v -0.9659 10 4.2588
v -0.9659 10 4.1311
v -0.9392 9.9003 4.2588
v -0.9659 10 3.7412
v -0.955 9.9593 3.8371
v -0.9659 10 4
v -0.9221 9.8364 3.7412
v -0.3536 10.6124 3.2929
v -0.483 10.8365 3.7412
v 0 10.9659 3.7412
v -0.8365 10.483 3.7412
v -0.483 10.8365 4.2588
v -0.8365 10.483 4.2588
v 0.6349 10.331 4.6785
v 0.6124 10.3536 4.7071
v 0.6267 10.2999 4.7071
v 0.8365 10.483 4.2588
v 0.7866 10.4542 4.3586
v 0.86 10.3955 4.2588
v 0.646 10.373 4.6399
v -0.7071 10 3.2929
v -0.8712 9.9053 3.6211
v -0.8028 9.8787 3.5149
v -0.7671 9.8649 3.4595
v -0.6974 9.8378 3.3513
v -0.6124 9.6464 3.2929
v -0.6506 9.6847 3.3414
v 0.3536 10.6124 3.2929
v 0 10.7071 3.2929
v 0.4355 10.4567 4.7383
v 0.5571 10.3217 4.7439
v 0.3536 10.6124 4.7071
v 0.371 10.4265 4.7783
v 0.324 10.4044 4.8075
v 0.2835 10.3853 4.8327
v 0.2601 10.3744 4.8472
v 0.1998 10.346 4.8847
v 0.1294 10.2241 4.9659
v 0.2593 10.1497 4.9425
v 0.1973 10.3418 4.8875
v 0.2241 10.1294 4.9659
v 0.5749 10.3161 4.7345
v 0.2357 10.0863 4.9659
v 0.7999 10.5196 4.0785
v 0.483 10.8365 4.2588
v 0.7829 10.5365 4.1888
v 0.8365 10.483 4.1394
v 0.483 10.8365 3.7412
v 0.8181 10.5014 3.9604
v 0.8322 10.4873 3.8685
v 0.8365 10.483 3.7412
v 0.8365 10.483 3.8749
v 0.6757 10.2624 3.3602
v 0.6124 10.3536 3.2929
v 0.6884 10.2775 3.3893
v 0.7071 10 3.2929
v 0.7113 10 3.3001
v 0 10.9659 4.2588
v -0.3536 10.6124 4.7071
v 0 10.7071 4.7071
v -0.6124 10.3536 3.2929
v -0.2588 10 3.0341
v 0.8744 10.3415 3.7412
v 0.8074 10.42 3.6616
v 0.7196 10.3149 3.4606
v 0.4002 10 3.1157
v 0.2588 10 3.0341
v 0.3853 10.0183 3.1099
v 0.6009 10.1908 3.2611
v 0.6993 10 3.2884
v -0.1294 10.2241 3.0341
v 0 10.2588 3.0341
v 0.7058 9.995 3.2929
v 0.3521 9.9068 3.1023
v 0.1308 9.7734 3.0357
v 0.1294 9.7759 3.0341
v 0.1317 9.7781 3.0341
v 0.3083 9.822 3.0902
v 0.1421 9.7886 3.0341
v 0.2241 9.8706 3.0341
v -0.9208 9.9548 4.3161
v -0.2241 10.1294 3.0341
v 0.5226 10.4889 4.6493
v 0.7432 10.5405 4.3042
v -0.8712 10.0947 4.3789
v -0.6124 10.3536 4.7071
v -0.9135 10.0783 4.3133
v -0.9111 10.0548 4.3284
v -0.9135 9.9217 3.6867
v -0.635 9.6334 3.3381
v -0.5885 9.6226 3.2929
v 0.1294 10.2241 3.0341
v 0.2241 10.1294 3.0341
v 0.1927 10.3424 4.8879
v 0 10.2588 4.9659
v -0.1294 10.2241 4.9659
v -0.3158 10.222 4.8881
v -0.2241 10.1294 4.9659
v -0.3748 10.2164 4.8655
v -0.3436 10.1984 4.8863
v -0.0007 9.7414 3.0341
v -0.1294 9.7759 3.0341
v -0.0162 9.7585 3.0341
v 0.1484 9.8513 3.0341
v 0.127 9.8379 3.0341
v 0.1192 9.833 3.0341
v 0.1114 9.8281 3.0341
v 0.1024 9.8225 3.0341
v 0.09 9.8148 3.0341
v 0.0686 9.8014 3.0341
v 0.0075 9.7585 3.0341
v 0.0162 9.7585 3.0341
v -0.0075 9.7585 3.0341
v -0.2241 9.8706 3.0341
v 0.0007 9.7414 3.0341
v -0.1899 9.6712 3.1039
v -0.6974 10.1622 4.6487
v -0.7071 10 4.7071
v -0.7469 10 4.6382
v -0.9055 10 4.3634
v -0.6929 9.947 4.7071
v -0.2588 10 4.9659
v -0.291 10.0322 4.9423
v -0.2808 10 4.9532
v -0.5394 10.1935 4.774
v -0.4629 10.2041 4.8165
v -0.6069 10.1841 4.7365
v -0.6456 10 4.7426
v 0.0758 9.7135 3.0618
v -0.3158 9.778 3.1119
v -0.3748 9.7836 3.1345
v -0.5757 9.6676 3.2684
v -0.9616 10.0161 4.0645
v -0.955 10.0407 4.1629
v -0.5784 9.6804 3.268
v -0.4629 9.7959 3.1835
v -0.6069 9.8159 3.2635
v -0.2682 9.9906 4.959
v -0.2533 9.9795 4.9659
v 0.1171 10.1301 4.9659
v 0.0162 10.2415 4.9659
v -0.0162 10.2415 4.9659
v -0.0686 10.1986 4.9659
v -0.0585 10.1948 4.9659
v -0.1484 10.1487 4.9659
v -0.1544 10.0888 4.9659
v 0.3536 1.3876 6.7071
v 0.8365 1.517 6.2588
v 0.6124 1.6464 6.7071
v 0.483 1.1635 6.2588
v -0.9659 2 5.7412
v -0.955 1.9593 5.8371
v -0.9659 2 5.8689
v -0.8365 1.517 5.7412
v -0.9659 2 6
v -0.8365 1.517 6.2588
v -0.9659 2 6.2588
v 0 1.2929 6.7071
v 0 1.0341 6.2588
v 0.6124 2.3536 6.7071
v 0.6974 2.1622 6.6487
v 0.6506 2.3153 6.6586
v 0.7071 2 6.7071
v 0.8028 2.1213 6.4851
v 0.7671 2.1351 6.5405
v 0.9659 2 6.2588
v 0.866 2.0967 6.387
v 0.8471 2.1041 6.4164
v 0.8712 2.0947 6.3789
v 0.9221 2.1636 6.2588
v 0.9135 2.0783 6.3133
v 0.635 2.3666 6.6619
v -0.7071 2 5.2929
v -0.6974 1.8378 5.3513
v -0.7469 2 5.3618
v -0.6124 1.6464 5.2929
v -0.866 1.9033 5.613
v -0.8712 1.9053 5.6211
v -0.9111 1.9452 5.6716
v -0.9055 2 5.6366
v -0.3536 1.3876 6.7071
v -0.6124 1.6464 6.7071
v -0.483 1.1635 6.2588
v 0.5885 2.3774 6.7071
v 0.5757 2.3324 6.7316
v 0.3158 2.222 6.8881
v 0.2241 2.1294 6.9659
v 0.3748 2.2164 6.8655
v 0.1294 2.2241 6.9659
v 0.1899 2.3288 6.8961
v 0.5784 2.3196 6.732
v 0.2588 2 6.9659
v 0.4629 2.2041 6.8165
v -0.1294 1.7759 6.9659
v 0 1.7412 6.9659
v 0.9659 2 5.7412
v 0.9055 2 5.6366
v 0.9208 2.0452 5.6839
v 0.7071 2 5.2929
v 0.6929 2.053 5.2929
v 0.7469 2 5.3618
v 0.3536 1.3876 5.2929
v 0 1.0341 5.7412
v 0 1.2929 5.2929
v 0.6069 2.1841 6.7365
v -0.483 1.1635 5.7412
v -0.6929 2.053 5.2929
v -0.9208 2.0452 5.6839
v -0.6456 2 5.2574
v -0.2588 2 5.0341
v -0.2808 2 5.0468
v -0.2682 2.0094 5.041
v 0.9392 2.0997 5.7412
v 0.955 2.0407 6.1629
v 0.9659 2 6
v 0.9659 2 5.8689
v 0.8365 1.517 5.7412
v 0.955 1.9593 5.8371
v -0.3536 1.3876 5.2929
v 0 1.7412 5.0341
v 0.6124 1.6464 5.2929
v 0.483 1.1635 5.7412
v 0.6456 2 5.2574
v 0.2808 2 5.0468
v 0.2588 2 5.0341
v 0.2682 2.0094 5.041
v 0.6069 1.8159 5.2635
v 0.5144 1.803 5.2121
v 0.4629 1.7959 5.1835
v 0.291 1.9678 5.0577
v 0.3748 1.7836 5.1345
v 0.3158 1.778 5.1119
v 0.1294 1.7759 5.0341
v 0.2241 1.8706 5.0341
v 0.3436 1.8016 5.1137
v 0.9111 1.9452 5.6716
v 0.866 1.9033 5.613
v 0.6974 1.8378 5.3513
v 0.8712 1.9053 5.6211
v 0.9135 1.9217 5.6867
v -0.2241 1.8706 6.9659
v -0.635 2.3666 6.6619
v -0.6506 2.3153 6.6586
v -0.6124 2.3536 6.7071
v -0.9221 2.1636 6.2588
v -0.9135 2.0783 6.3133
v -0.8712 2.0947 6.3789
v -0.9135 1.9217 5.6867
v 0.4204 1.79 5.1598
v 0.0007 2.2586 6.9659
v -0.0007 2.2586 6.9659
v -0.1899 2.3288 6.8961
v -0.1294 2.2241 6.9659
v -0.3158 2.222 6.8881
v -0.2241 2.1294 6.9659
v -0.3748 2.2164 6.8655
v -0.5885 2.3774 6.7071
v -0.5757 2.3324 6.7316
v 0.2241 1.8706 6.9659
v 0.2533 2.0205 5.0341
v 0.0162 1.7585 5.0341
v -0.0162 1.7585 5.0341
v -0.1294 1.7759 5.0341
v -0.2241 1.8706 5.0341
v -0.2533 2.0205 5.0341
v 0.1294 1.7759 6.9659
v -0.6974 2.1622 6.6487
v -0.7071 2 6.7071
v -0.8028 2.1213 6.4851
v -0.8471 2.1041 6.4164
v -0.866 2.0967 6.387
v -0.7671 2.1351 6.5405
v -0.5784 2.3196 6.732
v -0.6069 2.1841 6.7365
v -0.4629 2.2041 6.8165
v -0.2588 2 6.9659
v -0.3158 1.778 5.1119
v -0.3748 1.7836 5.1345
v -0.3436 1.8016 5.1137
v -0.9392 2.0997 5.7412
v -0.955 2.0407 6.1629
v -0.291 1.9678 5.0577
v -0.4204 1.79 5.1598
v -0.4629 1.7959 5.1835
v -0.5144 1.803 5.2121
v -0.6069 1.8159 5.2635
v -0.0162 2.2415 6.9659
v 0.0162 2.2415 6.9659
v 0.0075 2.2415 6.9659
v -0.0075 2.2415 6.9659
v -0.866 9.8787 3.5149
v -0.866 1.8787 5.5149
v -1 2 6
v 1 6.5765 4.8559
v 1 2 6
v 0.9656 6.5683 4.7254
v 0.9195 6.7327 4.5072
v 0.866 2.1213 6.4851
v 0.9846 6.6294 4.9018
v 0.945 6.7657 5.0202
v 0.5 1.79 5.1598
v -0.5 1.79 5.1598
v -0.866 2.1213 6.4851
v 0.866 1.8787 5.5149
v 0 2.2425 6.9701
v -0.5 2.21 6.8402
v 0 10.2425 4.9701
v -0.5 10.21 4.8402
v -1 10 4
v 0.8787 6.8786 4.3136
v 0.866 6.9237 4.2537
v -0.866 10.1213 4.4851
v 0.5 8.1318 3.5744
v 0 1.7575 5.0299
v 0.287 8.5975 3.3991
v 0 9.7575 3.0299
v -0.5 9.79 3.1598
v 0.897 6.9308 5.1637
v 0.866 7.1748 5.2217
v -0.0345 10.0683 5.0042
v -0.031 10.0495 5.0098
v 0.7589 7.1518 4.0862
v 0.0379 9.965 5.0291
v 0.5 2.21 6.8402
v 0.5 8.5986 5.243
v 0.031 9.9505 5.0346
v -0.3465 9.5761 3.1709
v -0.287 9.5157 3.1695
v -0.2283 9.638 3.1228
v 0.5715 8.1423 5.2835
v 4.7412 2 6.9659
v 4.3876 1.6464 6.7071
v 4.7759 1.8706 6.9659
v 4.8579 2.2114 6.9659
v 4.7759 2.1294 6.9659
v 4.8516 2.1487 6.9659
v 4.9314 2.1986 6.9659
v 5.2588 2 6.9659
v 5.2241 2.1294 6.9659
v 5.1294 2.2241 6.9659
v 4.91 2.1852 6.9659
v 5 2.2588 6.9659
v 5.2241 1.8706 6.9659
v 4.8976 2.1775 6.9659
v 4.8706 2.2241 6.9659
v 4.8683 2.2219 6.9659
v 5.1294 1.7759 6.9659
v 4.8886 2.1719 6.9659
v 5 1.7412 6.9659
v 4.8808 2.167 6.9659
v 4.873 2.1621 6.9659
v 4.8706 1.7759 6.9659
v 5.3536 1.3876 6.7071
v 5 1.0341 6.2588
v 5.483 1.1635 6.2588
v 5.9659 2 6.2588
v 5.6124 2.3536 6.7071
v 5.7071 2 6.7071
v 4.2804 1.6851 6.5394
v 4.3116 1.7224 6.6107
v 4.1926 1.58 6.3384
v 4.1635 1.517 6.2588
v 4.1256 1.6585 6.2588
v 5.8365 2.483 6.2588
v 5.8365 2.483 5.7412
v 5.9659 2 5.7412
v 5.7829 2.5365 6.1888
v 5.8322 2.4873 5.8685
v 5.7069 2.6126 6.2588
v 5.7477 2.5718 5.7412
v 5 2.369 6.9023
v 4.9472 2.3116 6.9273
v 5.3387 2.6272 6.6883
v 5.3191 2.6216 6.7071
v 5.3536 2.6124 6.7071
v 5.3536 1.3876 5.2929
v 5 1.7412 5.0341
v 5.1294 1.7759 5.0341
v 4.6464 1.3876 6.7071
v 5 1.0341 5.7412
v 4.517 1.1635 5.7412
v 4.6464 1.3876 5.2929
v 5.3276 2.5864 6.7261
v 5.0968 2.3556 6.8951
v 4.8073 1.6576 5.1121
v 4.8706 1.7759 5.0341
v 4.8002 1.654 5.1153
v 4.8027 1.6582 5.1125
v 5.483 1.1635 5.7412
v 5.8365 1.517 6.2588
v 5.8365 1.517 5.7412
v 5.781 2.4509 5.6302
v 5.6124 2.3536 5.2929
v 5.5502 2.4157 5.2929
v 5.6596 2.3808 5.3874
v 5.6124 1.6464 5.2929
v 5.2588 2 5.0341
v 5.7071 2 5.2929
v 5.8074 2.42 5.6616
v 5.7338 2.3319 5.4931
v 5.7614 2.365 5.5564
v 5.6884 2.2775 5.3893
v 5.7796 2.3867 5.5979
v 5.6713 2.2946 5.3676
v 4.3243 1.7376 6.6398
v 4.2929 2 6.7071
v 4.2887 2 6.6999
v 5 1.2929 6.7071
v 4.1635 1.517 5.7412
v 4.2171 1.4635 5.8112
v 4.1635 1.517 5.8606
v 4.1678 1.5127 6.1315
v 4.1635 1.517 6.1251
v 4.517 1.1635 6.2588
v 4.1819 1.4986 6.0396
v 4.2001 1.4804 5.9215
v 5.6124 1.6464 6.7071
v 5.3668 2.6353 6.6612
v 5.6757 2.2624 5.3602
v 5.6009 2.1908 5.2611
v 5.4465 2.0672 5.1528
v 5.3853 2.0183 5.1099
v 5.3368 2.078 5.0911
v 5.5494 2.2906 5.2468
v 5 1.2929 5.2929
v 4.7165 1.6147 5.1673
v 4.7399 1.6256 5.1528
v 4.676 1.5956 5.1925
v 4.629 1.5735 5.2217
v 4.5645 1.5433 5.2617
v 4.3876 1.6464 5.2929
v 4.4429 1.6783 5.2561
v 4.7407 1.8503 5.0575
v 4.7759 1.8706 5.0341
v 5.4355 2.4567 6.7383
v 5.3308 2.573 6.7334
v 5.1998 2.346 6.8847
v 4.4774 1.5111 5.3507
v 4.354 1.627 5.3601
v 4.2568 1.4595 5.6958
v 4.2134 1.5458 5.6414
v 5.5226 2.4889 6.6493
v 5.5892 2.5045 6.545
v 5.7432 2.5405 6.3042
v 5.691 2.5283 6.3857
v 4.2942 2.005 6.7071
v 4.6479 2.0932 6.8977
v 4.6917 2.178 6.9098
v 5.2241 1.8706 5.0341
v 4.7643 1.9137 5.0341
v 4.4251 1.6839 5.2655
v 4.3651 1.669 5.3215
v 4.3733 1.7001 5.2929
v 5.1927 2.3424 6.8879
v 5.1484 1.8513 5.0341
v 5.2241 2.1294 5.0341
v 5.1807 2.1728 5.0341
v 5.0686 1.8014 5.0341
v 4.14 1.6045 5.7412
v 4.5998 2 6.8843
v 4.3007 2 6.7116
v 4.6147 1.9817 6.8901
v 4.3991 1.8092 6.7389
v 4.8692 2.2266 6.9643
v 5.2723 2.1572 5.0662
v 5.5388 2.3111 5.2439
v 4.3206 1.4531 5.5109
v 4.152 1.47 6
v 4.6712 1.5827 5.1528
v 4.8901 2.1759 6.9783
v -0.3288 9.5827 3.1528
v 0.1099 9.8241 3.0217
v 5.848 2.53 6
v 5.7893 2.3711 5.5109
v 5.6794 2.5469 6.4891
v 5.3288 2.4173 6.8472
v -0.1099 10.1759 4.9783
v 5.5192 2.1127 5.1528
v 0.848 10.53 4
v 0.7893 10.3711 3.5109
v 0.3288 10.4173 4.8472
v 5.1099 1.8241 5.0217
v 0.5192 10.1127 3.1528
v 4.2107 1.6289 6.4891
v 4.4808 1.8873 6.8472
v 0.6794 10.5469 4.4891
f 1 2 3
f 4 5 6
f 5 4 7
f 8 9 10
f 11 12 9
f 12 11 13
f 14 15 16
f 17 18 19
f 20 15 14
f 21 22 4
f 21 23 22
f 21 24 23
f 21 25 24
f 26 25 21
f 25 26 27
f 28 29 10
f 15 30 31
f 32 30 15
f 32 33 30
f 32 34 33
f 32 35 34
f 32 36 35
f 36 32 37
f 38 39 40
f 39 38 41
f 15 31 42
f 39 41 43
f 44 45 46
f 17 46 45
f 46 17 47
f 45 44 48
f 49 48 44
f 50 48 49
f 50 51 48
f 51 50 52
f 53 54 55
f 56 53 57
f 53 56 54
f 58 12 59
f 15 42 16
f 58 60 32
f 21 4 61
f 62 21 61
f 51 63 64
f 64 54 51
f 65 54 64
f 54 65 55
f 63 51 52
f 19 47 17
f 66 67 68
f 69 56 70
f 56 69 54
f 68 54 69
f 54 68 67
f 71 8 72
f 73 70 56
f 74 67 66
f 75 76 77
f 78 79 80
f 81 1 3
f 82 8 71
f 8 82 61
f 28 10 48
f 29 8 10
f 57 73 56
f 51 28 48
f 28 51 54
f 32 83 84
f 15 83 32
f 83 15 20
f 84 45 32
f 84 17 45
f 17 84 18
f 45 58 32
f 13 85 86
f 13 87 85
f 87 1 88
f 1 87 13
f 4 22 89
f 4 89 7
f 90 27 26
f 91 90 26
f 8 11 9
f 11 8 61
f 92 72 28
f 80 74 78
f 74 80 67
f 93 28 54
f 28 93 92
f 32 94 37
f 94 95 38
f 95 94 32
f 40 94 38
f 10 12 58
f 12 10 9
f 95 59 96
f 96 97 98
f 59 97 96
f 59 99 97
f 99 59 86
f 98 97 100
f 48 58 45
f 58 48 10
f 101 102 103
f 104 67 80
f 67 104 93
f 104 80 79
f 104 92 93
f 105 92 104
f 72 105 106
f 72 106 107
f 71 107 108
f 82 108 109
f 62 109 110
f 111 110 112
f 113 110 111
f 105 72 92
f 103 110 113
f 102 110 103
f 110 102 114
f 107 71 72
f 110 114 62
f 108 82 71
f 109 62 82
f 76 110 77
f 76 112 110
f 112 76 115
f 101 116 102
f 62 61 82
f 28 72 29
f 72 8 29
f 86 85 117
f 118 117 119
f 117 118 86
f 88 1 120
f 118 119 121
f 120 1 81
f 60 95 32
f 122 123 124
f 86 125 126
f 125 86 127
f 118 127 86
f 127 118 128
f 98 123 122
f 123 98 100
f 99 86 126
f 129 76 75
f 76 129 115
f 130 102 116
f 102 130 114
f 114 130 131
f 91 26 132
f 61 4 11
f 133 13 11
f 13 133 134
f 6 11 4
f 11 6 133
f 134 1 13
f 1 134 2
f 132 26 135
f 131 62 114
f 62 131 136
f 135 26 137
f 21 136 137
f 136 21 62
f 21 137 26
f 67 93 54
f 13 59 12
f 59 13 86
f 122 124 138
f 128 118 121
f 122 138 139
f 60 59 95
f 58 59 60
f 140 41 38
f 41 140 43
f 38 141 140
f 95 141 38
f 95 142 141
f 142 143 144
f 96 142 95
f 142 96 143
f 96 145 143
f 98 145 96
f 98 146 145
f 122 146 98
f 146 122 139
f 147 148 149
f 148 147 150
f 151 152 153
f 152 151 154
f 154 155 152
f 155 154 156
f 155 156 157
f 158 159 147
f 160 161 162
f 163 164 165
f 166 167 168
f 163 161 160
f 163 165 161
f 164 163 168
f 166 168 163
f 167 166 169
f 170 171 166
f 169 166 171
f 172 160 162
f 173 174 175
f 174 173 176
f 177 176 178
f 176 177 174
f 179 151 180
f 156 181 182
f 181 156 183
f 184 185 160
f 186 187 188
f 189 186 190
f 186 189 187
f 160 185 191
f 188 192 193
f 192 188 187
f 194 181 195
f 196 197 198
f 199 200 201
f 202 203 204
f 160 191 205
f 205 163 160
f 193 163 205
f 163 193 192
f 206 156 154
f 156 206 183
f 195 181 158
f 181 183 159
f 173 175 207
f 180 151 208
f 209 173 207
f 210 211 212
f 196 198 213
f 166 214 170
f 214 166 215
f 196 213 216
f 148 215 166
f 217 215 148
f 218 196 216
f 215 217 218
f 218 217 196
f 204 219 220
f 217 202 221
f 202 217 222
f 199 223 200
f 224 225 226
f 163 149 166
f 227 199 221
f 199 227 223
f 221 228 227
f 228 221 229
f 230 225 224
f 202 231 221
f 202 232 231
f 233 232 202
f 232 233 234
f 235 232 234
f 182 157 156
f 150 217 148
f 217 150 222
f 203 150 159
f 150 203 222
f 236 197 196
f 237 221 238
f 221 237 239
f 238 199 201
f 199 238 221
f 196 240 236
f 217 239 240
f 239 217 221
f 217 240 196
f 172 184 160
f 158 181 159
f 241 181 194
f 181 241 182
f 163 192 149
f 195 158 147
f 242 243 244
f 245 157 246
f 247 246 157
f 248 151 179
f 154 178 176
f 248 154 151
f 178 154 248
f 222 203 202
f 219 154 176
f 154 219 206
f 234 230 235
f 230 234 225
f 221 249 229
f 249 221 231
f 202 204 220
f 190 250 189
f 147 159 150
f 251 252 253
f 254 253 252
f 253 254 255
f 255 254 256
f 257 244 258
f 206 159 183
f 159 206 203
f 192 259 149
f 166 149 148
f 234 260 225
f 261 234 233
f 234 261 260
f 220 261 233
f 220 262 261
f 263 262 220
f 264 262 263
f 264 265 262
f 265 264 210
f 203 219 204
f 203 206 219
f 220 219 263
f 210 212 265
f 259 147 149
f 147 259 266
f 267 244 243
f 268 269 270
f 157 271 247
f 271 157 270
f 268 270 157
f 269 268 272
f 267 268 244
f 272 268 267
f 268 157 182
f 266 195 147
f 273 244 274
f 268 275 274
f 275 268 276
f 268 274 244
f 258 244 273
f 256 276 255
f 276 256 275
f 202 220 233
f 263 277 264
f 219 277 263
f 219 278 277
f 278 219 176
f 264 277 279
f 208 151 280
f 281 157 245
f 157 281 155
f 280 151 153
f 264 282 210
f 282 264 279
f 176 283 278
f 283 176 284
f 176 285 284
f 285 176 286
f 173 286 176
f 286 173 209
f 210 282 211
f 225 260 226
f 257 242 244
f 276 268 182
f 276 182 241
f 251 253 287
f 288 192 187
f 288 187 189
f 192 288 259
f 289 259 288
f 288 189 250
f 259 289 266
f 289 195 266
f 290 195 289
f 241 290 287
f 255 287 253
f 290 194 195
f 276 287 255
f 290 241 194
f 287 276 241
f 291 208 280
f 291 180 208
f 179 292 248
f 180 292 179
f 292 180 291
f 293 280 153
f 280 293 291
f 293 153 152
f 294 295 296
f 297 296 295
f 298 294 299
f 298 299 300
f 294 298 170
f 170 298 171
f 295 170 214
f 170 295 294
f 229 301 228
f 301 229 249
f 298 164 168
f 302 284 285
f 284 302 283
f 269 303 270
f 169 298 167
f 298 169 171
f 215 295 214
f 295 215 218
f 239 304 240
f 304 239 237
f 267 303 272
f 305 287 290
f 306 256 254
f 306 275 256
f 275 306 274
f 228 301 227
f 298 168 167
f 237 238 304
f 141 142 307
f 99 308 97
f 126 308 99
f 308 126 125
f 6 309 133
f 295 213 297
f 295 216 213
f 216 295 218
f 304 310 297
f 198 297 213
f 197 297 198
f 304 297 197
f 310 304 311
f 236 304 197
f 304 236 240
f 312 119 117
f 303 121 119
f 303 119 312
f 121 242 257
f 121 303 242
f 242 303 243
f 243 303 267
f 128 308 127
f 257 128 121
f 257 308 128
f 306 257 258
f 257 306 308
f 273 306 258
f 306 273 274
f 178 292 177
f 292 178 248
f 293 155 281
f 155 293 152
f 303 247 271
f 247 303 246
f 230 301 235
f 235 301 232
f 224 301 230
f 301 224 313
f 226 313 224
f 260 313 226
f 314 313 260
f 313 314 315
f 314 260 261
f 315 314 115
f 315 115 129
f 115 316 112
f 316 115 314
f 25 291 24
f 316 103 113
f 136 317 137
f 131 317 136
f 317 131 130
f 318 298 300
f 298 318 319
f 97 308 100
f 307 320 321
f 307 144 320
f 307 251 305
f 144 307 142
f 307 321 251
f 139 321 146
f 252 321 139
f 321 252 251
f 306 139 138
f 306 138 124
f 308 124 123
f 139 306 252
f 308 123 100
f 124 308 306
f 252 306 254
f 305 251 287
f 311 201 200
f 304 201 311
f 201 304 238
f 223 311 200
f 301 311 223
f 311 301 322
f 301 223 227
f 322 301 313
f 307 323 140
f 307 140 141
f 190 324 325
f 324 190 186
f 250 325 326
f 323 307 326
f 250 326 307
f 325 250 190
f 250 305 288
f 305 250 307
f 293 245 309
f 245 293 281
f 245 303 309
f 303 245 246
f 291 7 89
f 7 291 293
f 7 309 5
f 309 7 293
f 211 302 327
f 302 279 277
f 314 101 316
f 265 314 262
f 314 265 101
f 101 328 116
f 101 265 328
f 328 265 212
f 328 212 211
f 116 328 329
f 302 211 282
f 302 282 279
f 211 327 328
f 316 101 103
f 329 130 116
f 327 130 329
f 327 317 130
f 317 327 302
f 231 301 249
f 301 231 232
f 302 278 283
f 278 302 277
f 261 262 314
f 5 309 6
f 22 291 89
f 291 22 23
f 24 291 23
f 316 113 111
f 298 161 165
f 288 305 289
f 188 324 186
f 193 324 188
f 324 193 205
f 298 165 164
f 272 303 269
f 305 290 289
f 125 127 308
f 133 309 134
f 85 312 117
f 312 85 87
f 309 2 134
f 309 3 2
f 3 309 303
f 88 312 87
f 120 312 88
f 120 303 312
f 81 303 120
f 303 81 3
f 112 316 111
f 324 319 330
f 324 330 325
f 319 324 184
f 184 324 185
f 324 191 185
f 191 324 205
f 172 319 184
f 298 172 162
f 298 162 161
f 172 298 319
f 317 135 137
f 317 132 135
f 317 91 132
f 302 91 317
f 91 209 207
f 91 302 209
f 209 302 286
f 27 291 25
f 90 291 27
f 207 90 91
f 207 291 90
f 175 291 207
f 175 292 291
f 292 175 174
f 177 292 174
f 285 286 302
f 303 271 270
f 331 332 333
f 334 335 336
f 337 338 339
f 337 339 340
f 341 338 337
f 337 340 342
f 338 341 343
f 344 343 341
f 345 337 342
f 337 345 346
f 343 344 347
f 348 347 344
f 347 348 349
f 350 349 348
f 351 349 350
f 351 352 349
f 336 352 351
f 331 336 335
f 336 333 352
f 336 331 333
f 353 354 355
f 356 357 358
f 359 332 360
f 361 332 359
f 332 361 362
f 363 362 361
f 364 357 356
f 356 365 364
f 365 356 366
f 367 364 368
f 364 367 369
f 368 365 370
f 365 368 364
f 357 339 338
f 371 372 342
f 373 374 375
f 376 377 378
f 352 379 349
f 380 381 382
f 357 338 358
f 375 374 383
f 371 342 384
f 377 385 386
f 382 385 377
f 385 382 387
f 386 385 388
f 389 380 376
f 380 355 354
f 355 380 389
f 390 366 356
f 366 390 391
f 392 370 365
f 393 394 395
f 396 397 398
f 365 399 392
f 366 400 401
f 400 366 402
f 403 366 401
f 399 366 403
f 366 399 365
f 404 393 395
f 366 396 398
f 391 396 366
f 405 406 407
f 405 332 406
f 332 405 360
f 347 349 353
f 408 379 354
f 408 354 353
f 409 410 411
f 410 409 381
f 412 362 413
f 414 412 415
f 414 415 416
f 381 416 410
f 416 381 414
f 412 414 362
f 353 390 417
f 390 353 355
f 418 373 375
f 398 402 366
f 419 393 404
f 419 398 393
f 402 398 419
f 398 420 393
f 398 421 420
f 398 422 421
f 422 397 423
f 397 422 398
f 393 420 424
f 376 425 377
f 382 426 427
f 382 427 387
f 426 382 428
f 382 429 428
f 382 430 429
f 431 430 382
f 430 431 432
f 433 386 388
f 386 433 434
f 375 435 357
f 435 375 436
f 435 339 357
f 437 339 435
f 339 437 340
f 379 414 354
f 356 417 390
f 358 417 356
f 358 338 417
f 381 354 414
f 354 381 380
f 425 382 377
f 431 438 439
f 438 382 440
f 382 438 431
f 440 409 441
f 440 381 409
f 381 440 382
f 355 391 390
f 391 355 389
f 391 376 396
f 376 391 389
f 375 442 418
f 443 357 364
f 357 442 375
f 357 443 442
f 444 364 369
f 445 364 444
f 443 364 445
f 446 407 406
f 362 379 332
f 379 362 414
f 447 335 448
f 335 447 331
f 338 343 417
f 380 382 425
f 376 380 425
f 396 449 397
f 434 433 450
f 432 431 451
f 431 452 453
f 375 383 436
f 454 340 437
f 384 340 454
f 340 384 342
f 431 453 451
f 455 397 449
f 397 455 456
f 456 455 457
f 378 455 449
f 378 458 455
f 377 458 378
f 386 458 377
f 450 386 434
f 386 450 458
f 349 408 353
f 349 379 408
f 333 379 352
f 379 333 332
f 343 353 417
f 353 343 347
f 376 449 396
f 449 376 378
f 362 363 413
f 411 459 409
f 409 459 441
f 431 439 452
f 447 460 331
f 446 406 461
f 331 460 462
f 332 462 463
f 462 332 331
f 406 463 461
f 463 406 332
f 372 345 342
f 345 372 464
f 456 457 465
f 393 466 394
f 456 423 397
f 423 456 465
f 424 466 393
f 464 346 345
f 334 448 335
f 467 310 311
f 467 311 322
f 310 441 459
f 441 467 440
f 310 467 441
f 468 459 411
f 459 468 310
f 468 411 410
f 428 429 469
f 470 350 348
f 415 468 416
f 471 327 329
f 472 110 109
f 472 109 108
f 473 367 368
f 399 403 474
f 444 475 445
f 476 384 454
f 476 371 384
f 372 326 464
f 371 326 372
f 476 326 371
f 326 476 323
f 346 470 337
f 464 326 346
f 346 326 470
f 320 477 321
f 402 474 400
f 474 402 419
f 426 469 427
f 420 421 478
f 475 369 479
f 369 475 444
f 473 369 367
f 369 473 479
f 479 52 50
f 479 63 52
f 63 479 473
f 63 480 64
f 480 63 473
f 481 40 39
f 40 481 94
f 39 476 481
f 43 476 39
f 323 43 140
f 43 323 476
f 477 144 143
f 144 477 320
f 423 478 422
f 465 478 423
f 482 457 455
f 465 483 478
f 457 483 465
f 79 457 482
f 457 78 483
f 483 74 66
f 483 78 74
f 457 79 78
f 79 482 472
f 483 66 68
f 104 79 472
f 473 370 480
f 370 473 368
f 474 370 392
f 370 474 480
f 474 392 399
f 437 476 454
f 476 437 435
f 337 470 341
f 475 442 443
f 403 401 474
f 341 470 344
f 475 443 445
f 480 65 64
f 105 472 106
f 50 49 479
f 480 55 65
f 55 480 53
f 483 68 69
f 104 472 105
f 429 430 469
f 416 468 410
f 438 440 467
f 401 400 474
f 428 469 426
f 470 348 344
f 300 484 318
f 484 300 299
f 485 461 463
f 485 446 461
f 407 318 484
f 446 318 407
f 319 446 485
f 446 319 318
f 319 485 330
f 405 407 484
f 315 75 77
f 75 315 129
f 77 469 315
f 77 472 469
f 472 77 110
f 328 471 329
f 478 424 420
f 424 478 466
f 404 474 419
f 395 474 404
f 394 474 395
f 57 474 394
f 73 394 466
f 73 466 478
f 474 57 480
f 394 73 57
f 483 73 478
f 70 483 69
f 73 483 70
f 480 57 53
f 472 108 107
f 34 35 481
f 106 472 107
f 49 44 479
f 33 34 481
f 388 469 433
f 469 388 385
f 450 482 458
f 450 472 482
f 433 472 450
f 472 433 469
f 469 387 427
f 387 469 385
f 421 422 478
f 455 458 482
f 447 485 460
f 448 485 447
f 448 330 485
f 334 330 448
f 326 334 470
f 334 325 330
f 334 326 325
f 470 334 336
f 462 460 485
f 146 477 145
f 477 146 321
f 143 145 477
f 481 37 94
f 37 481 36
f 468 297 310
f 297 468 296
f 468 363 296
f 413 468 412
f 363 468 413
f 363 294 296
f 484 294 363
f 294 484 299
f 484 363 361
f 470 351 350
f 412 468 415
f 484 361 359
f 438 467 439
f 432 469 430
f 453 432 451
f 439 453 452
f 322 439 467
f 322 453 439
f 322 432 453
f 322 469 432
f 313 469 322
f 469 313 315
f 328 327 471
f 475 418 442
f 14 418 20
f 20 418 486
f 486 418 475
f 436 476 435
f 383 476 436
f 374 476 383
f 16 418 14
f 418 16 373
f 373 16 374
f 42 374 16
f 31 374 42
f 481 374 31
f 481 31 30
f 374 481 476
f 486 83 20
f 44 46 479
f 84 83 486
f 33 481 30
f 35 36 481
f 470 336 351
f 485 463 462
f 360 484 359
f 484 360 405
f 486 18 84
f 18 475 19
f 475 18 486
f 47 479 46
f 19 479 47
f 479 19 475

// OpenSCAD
$fn = 12;

module cylinder_ep(p1, p2, r1, r2) {
     translate(p1) sphere(r=r1);
     translate(p2) sphere(r=r2);
     vector = [p2[0] - p1[0], p2[1] - p1[1], p2[2] - p1[2]];
     distance = sqrt(pow(vector[0], 2) +
		     pow(vector[1], 2) +
		     pow(vector[2], 2));
     translate(vector/2 + p1)
	  rotate([0, 0, atan2(vector[1], vector[0])])
	  rotate([0, atan2(sqrt(pow(vector[0], 2) +
                                pow(vector[1], 2)), vector[2]), 0])
	  cylinder(h = distance, r1 = r1, r2 = r2, center=true);
}

cylinder_ep([0, 10, 4], [0, 2, 6], 1, 1);
cylinder_ep([0, 10, 4], [5, 2, 6], 1, 1);
